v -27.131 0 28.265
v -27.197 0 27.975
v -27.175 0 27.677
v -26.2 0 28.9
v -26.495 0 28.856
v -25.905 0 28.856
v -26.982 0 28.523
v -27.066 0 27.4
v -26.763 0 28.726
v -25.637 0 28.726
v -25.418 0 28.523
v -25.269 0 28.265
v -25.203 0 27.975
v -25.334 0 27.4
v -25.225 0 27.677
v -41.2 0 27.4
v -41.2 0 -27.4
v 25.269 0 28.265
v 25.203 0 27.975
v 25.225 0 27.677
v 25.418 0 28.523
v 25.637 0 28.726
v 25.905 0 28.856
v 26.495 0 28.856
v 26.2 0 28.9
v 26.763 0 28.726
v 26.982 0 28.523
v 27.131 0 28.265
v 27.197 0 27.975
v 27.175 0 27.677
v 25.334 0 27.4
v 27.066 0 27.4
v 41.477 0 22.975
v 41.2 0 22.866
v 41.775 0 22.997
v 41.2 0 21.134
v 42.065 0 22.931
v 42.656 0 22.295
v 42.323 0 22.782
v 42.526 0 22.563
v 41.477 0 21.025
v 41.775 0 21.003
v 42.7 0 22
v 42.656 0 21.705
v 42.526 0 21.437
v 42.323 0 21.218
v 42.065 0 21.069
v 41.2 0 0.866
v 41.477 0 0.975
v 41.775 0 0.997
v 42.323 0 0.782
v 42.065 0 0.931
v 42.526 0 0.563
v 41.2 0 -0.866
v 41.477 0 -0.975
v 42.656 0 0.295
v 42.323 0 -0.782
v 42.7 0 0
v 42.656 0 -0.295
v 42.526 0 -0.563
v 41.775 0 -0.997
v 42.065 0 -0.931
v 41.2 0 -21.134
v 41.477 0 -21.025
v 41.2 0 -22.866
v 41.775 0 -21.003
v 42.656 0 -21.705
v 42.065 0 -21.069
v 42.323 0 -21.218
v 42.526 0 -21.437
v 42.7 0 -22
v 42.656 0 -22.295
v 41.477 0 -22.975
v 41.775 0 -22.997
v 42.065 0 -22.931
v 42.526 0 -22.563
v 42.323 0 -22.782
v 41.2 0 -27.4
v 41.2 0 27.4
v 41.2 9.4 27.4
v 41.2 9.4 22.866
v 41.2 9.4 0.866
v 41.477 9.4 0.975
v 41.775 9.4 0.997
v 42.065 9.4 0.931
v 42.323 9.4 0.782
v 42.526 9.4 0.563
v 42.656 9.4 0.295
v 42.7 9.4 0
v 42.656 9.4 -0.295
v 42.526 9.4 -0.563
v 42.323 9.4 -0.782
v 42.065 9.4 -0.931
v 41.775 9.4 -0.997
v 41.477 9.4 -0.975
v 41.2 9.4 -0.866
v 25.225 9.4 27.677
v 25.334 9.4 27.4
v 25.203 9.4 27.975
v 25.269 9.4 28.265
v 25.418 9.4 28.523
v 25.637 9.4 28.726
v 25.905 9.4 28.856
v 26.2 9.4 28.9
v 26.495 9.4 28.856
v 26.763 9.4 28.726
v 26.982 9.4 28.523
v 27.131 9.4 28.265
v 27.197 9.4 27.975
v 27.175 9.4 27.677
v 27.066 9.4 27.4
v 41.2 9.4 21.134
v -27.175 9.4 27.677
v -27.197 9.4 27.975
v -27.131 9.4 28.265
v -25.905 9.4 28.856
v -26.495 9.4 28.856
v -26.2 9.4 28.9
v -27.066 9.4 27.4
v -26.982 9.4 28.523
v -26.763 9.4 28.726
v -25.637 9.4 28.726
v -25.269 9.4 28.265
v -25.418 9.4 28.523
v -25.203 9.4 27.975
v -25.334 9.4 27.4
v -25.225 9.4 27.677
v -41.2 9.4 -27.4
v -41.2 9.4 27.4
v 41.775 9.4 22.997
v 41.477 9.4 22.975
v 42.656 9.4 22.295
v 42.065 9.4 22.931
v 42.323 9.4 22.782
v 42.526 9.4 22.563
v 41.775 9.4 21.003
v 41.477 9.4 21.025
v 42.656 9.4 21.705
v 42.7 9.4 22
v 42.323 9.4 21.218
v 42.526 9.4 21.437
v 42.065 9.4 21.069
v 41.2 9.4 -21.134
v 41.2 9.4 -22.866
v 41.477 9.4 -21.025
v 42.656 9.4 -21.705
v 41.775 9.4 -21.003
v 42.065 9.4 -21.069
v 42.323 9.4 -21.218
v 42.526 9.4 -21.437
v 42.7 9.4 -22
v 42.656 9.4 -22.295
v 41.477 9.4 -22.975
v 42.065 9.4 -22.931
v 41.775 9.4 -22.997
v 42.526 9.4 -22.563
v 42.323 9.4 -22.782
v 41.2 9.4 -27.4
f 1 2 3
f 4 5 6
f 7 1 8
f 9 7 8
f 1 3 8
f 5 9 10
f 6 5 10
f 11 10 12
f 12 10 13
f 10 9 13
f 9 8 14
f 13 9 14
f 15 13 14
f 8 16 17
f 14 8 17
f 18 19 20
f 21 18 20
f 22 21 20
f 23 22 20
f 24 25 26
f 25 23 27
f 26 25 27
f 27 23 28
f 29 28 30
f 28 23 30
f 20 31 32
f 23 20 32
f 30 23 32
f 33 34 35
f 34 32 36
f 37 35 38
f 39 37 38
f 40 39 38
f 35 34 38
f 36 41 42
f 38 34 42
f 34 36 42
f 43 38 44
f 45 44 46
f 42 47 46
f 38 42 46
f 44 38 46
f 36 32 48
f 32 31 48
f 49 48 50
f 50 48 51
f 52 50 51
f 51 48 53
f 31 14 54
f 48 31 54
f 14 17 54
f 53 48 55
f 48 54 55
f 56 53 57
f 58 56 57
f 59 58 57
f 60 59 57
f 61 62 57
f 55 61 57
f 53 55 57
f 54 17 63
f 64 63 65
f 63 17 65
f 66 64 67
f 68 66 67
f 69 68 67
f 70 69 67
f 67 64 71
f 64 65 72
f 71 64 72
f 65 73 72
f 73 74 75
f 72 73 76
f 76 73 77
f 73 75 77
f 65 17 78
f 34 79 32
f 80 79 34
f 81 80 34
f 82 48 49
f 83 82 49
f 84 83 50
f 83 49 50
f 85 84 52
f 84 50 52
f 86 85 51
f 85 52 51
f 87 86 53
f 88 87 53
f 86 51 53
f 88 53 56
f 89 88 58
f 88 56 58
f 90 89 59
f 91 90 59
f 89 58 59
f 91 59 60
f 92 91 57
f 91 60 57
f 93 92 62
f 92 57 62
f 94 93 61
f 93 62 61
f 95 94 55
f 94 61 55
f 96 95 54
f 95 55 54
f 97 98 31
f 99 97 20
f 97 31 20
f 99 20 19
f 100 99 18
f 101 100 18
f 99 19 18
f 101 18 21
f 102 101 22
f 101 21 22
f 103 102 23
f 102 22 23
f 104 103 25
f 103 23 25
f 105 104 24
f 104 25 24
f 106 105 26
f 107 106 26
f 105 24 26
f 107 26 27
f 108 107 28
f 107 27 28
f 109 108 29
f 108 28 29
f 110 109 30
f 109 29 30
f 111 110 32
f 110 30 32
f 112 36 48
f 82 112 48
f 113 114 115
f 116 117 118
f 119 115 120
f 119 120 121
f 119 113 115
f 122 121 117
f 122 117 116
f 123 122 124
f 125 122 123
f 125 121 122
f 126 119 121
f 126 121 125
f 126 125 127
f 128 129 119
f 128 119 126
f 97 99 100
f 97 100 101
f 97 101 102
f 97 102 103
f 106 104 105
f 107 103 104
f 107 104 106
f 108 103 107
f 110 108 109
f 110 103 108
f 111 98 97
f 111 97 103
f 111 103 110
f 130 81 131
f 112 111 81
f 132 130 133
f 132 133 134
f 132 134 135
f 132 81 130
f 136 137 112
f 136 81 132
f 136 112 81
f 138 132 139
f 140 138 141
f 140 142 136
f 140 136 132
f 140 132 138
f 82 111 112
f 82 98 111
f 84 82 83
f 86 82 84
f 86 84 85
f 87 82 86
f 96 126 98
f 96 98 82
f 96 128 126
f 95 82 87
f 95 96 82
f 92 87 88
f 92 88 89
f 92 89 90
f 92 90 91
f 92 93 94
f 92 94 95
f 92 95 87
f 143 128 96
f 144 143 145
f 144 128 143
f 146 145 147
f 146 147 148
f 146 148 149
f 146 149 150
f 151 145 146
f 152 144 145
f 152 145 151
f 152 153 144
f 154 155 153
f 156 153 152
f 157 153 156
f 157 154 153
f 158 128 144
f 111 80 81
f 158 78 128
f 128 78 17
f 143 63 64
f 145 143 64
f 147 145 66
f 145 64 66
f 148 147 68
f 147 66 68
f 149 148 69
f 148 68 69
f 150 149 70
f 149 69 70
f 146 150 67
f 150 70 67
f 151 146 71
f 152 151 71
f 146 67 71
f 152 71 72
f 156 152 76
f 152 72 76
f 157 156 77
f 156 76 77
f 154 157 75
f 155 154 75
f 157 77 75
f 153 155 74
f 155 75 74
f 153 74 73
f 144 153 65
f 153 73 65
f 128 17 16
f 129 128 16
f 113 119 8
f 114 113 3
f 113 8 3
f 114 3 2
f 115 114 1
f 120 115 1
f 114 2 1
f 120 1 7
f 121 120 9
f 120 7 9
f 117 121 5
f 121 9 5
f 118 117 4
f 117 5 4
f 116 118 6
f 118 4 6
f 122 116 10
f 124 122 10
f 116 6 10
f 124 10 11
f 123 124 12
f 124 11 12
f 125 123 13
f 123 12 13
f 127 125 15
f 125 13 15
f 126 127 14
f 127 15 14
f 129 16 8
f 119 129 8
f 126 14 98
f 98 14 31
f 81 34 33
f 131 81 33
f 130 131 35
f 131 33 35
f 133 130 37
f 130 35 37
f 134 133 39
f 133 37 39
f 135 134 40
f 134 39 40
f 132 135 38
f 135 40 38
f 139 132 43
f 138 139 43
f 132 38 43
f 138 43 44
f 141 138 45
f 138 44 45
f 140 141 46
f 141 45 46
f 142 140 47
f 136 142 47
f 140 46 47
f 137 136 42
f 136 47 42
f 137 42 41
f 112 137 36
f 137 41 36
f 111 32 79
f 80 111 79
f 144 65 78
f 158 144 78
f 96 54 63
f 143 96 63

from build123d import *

# Parameters (mm, degrees)
BOSS_EXTRUDE1_DEPTH = 9.4


with BuildPart() as part:
    # Sketch1 → Boss-Extrude1 (new body)
    with BuildSketch(Plane(origin=(0, 0, 0), x_dir=(1, 0, 0), z_dir=(0, 1, 0))):
        with BuildLine():
            Line((-41.2, -27.4), (-27.066025404, -27.4))
            ThreePointArc((-27.066025404, -27.4), (-26.2, -28.9), (-25.333974596, -27.4))
            Line((-25.333974596, -27.4), (25.333974596, -27.4))
            ThreePointArc((25.333974596, -27.4), (26.2, -28.9), (27.066025404, -27.4))
            Line((27.066025404, -27.4), (41.2, -27.4))
            Line((41.2, -27.4), (41.2, -22.866025404))
            ThreePointArc((41.2, -22.866025404), (42.7, -22), (41.2, -21.133974596))
            Line((41.2, -21.133974596), (41.2, -0.866025404))
            ThreePointArc((41.2, -0.866025404), (42.7, 0), (41.2, 0.866025404))
            Line((41.2, 0.866025404), (41.2, 21.133974596))
            ThreePointArc((41.2, 21.133974596), (42.7, 22), (41.2, 22.866025404))
            Line((41.2, 22.866025404), (41.2, 27.4))
            Line((41.2, 27.4), (-41.2, 27.4))
            Line((-41.2, 27.4), (-41.2, -27.4))
        make_face()
    extrude(amount=BOSS_EXTRUDE1_DEPTH)


solid = part.part
